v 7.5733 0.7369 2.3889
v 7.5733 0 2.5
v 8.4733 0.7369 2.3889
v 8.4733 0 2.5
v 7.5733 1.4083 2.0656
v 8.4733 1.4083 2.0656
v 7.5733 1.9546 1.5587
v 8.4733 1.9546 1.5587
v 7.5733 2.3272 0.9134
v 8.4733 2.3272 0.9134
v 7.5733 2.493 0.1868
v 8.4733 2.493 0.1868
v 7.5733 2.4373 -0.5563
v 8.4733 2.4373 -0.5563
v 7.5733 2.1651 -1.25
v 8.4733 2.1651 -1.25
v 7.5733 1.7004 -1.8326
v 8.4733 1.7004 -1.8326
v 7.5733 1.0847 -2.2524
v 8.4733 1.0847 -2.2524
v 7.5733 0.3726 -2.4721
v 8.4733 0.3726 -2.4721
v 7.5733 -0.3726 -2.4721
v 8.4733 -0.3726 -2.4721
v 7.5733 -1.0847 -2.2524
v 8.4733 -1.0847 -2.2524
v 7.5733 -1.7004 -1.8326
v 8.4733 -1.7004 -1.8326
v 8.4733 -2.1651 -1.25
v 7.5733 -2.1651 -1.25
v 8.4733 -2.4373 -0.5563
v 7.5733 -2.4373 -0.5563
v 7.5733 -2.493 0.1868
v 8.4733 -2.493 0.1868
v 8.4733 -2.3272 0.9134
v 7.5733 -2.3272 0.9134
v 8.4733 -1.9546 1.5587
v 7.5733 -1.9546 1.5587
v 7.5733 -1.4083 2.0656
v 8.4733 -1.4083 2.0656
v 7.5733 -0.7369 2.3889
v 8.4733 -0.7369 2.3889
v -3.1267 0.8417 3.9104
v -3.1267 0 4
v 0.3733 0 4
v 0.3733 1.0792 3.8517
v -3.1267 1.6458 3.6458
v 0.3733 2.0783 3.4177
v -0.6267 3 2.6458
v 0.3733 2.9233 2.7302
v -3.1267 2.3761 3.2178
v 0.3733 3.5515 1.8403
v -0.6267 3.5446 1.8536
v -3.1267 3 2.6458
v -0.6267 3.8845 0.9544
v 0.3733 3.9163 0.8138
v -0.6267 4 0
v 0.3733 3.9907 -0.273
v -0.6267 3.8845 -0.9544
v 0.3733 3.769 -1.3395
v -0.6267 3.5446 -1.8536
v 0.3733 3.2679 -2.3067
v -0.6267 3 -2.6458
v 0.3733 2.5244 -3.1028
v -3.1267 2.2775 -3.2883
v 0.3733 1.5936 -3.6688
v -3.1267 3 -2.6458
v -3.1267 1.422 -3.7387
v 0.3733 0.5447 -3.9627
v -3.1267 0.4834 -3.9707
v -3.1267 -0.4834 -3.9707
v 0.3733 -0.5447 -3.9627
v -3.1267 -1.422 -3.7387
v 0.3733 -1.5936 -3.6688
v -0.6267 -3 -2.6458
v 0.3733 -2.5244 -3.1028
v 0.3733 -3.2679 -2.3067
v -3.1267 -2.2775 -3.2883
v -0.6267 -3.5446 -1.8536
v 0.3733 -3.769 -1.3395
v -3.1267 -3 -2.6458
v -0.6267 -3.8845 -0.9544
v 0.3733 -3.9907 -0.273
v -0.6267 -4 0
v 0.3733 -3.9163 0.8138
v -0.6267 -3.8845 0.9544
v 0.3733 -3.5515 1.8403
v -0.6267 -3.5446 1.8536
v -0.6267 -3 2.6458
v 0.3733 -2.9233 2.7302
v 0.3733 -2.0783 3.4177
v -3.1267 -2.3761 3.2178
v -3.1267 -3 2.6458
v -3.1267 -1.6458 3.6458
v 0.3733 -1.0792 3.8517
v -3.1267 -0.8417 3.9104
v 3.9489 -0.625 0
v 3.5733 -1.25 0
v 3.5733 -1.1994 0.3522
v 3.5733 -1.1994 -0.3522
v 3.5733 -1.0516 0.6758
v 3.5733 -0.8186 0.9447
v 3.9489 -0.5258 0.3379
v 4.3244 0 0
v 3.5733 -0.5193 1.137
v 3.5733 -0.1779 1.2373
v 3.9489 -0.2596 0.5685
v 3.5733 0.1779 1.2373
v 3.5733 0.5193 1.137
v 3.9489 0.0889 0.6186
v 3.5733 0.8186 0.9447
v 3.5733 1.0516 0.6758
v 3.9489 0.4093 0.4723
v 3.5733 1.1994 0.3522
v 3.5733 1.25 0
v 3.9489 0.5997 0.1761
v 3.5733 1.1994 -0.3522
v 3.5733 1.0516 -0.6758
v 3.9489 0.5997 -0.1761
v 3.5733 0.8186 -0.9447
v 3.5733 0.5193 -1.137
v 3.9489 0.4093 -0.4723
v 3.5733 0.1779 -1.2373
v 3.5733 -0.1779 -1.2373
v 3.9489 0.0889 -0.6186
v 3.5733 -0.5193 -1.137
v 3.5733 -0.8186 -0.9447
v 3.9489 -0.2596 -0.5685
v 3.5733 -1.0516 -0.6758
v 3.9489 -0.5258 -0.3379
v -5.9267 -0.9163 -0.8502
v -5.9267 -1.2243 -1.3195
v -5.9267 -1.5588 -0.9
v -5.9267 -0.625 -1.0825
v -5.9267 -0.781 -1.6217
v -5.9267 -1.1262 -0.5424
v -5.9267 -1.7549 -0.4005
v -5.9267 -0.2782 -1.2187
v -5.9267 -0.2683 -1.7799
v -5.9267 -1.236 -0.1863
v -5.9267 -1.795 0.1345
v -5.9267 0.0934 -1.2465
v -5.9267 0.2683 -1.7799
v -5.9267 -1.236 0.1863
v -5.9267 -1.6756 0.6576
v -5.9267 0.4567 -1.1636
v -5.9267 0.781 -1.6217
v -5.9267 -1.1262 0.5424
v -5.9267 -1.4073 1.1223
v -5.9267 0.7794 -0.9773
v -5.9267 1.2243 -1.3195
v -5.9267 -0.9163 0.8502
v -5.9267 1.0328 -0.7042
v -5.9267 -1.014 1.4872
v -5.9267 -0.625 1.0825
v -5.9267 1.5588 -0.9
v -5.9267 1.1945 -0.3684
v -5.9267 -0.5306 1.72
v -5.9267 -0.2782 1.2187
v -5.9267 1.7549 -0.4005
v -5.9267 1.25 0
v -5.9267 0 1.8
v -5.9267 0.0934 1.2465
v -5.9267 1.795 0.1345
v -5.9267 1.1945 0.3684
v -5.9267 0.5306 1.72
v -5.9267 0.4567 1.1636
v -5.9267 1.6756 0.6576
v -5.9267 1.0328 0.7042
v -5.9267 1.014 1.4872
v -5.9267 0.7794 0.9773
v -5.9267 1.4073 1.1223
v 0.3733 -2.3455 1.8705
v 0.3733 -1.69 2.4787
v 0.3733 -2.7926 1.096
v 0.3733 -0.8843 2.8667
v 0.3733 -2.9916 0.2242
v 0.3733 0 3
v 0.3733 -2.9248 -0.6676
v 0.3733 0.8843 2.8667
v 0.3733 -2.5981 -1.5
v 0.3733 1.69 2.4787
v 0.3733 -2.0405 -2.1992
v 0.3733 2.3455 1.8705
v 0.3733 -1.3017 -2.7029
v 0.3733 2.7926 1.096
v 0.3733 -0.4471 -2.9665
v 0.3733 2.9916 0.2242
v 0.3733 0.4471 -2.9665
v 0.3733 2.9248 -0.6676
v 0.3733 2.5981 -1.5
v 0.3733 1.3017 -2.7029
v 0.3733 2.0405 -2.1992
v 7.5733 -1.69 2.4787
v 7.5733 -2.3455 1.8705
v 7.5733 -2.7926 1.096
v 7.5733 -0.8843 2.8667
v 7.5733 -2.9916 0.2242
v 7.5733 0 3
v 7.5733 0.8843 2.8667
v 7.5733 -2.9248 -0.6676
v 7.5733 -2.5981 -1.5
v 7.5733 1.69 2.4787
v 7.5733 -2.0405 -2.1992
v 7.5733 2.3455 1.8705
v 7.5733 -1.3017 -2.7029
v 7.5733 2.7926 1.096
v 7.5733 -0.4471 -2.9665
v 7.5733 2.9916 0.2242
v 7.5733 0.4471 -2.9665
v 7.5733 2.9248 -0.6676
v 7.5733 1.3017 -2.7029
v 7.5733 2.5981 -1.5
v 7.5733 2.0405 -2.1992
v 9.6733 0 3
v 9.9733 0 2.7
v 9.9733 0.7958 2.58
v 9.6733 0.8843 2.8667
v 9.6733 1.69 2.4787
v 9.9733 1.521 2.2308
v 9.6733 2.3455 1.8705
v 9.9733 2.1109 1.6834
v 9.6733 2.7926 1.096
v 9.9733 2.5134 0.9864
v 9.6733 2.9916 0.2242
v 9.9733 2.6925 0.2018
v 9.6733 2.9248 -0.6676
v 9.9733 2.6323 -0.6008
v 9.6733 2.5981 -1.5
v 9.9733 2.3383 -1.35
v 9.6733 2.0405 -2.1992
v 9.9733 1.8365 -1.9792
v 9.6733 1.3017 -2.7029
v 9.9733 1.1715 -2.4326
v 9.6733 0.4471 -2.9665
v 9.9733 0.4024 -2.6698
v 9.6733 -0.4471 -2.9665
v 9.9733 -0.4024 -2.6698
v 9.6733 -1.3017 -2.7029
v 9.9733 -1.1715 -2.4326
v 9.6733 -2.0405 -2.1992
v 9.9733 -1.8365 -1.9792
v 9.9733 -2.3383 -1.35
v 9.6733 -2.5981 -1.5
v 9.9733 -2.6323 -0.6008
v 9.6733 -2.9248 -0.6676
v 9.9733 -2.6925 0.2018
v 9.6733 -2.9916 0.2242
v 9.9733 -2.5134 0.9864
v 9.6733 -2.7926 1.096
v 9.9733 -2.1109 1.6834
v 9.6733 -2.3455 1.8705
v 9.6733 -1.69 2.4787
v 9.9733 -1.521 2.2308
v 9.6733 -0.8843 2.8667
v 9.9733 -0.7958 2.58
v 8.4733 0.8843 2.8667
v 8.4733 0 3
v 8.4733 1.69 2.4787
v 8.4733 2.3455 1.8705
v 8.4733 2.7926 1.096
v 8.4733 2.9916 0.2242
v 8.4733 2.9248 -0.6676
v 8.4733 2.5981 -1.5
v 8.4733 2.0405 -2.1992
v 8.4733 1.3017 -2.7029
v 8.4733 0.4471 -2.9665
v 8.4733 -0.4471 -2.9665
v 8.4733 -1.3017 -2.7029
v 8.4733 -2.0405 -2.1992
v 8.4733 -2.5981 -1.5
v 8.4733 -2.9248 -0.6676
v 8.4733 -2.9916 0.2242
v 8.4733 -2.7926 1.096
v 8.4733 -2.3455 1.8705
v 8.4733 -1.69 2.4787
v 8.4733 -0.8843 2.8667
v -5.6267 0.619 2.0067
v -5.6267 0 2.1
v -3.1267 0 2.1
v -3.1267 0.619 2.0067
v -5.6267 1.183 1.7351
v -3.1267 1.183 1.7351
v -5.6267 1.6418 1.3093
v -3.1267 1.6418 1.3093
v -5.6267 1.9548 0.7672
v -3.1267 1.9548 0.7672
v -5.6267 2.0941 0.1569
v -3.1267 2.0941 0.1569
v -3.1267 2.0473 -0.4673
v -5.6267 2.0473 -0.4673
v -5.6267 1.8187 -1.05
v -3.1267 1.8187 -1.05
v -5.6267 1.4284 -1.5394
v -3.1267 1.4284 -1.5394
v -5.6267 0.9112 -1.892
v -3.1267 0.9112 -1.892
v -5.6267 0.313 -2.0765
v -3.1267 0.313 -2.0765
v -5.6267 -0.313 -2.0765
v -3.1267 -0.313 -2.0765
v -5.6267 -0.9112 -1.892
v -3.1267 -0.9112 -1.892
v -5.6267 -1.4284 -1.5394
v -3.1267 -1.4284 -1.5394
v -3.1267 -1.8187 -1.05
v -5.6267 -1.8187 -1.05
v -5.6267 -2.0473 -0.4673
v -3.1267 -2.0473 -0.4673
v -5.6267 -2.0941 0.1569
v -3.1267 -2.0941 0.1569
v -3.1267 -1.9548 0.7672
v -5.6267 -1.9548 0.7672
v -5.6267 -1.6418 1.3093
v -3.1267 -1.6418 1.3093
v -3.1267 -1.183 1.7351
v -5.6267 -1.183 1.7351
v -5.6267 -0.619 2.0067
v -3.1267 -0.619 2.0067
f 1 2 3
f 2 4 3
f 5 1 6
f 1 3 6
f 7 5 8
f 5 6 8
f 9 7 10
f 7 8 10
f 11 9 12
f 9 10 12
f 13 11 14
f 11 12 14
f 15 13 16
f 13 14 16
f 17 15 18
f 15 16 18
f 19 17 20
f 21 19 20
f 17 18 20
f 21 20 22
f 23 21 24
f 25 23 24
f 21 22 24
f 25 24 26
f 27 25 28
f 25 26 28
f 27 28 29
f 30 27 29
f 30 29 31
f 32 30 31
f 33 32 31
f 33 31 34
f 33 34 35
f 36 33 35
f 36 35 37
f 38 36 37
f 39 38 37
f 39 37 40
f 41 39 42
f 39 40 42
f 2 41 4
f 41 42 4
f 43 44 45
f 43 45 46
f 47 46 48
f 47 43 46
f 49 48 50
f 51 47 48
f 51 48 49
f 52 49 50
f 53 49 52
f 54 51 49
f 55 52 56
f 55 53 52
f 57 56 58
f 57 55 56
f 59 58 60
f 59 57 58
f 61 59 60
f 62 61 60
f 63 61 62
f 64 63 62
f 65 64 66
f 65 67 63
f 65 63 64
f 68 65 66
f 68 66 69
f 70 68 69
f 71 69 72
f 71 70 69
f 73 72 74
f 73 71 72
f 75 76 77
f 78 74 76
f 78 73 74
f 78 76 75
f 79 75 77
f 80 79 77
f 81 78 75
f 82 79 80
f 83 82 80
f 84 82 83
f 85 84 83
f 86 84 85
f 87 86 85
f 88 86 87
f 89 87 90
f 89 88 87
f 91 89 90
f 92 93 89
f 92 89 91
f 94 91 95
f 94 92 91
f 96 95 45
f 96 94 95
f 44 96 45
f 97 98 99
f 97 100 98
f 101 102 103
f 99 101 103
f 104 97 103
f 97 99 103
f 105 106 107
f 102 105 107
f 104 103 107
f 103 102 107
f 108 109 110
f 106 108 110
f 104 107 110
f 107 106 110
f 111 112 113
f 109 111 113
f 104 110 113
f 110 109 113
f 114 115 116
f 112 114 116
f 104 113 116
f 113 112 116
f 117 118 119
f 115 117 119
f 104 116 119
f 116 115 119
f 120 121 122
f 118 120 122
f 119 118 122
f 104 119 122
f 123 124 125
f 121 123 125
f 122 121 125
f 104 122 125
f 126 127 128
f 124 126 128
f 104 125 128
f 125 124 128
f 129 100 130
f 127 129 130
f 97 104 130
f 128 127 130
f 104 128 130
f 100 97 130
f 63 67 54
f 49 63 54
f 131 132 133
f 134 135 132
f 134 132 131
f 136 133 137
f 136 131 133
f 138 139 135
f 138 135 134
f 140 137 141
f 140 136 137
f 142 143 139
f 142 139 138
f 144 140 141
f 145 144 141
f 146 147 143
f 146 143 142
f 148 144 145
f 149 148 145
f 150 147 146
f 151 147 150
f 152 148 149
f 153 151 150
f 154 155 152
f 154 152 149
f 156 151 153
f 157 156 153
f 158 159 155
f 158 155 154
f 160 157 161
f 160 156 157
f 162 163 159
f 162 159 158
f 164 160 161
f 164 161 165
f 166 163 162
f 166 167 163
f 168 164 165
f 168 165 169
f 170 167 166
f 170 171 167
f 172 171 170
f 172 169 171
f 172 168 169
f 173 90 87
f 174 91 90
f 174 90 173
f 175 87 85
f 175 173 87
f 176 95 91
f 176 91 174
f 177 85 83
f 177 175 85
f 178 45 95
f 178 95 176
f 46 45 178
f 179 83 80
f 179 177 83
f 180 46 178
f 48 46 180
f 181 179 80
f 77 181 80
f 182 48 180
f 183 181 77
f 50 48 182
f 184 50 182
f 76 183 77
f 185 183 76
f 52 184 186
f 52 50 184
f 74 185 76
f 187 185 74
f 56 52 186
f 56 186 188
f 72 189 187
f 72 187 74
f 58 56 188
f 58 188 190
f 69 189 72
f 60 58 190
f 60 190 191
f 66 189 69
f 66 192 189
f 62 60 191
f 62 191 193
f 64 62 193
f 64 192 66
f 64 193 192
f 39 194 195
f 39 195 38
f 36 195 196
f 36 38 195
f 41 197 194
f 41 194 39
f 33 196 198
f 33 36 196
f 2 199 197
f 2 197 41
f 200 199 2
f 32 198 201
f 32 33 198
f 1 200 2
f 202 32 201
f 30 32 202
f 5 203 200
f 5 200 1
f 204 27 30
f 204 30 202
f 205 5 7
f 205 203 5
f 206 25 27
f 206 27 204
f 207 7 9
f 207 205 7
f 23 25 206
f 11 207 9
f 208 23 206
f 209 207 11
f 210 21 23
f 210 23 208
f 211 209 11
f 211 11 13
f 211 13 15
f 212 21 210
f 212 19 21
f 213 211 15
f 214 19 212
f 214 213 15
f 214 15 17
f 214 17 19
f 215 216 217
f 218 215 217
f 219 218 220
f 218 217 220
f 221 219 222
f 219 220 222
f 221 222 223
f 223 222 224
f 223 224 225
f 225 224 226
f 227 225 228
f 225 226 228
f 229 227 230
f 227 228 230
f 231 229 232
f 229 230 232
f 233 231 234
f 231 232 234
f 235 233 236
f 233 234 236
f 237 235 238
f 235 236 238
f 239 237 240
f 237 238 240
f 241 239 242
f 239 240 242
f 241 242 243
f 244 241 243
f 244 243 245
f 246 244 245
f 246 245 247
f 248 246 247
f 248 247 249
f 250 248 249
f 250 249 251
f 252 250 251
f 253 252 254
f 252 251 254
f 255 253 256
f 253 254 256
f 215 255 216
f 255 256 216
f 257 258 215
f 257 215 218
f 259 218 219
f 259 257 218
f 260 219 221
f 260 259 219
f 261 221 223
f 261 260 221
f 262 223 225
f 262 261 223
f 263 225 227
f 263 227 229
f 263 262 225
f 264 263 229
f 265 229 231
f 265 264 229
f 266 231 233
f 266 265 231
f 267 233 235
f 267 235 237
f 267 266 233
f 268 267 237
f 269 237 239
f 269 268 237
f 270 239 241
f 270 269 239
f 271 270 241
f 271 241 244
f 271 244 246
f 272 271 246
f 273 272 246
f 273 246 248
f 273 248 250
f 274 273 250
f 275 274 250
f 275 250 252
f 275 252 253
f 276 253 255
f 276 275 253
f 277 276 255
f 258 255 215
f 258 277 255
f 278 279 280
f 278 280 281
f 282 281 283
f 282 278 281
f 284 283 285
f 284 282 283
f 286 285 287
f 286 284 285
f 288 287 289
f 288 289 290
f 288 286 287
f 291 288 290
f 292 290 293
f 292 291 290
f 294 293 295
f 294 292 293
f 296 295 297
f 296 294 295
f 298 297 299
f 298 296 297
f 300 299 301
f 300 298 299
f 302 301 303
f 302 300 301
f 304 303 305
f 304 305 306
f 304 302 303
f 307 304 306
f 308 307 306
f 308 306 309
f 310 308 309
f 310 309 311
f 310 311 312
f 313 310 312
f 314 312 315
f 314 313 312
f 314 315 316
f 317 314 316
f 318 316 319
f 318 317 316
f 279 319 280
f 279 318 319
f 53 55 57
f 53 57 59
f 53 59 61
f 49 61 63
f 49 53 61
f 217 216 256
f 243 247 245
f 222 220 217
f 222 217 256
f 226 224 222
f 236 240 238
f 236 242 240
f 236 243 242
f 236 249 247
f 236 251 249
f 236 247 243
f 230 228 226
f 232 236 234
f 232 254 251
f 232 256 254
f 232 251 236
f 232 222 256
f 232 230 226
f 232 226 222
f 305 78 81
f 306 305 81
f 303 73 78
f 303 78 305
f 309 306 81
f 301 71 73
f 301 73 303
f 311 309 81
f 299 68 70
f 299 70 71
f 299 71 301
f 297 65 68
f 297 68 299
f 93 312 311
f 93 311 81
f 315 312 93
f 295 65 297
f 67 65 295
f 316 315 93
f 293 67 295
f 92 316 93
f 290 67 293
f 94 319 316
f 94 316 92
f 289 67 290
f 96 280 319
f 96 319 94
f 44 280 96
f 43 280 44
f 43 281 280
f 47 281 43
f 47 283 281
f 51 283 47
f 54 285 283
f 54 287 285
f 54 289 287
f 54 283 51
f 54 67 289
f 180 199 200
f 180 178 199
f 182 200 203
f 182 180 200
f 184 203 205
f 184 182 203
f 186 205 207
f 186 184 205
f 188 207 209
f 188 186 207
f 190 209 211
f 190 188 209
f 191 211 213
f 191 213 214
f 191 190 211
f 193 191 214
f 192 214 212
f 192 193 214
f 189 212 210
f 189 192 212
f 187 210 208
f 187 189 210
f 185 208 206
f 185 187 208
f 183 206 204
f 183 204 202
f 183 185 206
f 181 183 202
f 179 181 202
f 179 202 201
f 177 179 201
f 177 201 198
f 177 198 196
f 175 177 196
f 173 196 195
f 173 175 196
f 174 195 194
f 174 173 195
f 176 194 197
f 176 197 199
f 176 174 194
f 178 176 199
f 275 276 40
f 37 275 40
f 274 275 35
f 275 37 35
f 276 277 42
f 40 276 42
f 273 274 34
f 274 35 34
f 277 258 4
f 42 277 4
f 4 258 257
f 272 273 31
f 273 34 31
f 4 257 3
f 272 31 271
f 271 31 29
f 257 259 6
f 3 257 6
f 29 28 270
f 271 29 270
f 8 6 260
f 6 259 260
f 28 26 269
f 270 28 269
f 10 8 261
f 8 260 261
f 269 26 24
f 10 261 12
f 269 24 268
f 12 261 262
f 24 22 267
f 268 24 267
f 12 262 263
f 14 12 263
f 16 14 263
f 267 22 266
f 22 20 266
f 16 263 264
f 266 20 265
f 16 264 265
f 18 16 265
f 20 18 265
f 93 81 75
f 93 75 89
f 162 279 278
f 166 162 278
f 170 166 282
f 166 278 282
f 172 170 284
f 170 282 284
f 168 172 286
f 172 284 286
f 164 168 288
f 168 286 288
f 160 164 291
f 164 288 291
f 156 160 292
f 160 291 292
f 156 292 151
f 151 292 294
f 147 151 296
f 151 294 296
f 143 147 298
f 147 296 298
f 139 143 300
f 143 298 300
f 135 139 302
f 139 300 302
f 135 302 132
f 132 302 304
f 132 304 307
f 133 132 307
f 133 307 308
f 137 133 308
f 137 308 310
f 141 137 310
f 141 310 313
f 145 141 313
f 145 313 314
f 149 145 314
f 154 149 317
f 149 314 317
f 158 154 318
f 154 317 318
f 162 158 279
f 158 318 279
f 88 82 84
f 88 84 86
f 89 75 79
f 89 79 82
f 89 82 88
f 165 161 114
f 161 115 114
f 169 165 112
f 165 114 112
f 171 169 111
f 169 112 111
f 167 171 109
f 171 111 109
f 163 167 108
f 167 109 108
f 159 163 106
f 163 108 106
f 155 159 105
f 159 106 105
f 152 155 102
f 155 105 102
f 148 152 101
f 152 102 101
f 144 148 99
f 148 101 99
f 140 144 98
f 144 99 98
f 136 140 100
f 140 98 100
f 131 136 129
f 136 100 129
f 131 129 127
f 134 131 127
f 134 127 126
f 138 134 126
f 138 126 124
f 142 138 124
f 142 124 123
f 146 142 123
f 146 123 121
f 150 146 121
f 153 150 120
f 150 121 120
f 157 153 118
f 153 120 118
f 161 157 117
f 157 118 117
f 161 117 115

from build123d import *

# Parameters (mm, degrees)
F2_W     = 4
F2_H     = 10
F3_DEPTH = 2.5
F5_D     = 2.5
F5_DEPTH = 9.5
F5_TIP   = 0.7510757738
F6_W     = 0.9
F6_H     = 2
F8_SIZE  = 0.3


with BuildPart() as f1:
    # F0 (on Front) → F1 (revolve)
    with BuildSketch(Plane.XZ):
        Polygon((-5.9266670129, 2.1), (-5.9266670129, 0), (9.9733329871, 0), (9.9733329871, 3), (0.3733329871, 3), (0.3733329871, 4), (-3.1266670129, 4), (-3.1266670129, 2.1), align=None)
    revolve(axis=Axis((2.0233329871, 0, 0), (-1, 0, 0)))

    # F2 (on face) → F3 (cut)
    with BuildSketch(Plane(origin=(-3.1266670129, 0, 0), x_dir=(0, -1, 0), z_dir=(-1, 0, 0))):
        with Locations((5, 0)):
            Rectangle(F2_W, F2_H)
        with Locations((-5, 0)):
            Rectangle(F2_W, F2_H)
    extrude(amount=-F3_DEPTH, mode=Mode.SUBTRACT)

    # F5
    with Locations(Plane(origin=(-5.9266670129, 0, 0), x_dir=(0, -1, 0), z_dir=(-1, 0, 0))):
        with Locations((0, 0)):
            Hole(F5_D / 2, depth=F5_DEPTH)
            with Locations((0, 0, -(F5_DEPTH + F5_TIP / 2))):  # 118° drill point
                Cone(0, F5_D / 2, F5_TIP, mode=Mode.SUBTRACT)

    # F6 (on Front) → F7 (revolve, cut)
    with BuildSketch(Plane.XZ):
        with Locations((8.0233329871, 3.5)):
            Rectangle(F6_W, F6_H)
    revolve(axis=Axis((2.0233329871, 0, 0), (-1, 0, 0)), mode=Mode.SUBTRACT)

    # F8
    f8_edges = [f1.edges().sort_by_distance(p)[0] for p in [
        (9.973333, 0, -3),
        (-5.926667, 0, -2.1),
    ]]
    chamfer(f8_edges, length=F8_SIZE)


solid = f1.part
